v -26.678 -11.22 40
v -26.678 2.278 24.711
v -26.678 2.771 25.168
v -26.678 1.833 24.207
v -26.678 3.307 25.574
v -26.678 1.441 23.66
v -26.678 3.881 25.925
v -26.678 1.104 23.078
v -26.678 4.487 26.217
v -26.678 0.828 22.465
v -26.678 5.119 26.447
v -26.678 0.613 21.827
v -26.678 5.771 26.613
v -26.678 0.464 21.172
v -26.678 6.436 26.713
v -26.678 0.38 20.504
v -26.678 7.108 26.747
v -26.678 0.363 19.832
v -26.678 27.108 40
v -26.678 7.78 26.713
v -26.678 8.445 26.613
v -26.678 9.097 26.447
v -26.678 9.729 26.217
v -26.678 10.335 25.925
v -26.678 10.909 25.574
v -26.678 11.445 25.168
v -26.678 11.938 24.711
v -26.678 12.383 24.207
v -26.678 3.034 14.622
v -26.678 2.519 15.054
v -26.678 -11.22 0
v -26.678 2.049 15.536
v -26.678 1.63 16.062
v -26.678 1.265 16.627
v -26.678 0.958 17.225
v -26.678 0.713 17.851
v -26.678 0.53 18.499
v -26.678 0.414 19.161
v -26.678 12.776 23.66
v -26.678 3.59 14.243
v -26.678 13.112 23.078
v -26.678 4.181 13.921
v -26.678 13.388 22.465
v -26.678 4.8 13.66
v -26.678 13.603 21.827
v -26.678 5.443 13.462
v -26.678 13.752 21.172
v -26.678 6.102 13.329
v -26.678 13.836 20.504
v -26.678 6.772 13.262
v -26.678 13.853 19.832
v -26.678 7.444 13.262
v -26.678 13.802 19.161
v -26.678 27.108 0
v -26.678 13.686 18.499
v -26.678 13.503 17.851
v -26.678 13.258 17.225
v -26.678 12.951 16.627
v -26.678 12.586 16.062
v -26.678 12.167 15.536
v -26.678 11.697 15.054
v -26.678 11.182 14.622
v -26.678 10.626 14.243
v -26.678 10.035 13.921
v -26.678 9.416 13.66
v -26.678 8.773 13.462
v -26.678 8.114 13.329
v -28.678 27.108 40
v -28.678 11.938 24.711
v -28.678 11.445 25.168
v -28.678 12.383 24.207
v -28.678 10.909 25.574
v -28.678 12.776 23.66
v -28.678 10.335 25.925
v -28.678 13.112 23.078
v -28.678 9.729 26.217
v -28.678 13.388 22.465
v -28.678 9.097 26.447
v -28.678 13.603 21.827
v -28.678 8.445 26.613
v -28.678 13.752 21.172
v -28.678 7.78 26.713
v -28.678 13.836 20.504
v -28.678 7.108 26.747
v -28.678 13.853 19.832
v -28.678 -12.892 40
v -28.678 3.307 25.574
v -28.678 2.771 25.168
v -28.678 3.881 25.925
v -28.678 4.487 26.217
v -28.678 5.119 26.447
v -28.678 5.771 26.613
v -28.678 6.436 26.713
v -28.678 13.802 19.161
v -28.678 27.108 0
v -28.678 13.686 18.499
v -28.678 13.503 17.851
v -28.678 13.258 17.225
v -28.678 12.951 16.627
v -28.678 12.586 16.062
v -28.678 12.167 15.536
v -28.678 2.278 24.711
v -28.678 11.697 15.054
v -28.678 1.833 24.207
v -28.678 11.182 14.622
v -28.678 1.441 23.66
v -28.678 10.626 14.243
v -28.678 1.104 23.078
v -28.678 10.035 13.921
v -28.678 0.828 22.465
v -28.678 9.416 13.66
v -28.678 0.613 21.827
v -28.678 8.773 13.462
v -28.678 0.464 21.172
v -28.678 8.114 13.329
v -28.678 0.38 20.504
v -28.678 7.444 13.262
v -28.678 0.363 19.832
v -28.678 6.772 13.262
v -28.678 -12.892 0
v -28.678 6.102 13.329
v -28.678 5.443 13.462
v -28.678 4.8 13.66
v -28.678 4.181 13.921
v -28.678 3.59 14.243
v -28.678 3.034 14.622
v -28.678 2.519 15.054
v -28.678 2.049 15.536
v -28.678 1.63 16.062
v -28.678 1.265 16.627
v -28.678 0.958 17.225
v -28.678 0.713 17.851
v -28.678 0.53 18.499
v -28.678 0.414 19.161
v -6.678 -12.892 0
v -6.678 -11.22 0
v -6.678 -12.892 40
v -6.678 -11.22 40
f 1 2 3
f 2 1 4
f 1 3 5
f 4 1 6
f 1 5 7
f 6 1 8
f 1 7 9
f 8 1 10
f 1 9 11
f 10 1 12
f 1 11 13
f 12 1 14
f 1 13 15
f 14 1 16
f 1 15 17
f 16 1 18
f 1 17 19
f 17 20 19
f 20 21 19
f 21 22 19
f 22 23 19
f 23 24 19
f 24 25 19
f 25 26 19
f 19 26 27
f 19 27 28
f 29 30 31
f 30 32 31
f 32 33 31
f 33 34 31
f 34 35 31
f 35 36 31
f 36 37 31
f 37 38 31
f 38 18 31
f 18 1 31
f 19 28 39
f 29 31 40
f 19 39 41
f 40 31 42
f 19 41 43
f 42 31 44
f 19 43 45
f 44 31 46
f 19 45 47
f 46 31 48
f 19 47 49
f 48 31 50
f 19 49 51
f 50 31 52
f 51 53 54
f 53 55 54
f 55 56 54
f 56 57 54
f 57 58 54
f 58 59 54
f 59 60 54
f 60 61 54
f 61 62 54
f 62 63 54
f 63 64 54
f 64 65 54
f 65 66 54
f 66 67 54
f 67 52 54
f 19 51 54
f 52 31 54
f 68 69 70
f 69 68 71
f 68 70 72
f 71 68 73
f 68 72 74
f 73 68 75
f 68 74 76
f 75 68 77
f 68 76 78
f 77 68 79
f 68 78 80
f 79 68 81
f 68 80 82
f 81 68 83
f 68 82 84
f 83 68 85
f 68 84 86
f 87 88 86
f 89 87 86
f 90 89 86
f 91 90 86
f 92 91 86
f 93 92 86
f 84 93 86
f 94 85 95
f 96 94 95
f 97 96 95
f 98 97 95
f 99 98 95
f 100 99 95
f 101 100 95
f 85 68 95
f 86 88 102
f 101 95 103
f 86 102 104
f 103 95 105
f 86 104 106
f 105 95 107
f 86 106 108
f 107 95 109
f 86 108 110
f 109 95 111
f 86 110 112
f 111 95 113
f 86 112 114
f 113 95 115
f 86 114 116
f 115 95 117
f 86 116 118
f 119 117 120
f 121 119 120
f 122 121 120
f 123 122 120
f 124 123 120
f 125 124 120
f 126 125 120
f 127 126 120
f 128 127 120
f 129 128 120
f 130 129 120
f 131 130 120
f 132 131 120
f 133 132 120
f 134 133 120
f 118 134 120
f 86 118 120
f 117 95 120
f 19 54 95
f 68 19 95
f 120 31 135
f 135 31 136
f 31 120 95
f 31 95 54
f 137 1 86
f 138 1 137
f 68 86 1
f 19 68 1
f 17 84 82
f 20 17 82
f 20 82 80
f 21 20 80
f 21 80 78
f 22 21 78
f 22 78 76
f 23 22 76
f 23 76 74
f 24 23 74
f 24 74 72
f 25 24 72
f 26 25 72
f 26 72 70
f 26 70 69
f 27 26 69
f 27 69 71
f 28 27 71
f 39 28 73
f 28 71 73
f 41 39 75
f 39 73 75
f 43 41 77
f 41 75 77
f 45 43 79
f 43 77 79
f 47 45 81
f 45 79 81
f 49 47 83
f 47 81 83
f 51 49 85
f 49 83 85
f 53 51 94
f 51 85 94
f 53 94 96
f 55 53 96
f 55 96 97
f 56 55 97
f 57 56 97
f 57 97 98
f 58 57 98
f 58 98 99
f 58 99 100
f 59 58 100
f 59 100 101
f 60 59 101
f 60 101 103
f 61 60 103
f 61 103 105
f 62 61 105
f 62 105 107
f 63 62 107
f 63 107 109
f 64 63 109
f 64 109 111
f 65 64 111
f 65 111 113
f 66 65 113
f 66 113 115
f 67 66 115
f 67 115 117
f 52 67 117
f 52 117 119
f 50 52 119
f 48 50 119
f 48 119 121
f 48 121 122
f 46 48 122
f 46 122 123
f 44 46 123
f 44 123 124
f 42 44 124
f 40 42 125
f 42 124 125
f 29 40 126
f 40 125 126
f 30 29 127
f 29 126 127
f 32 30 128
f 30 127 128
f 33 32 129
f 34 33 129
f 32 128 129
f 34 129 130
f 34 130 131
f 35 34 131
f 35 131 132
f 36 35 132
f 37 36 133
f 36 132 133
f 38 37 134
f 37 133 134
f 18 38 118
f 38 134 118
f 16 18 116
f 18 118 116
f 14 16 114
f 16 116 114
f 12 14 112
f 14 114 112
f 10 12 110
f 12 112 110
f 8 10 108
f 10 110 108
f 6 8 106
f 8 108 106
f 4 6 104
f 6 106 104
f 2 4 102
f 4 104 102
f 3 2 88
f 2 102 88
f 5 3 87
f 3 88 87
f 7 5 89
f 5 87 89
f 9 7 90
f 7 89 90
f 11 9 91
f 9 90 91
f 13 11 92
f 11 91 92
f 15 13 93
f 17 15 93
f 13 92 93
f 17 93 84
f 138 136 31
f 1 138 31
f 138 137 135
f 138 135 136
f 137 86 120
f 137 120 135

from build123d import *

# Parameters (mm, degrees)
BOSS_EXTRUDE1_DEPTH = 40
SKETCH2_R           = 6.746805348
CUT_EXTRUDE1_DEPTH  = 40


with BuildPart() as part:
    # Sketch1 → Boss-Extrude1 (new body)
    with BuildSketch(Plane.XY):
        Polygon((-28.677527702, 27.108013937), (-28.677527702, -12.891986063), (-6.677527702, -12.891986063), (-6.677527702, -11.219512195), (-26.677527702, -11.219512195), (-26.677527702, 27.108013937), (-27.701917946, 27.108013937), align=None)
    extrude(amount=BOSS_EXTRUDE1_DEPTH)

    # Sketch2 → Cut-Extrude1 (cut)
    with BuildSketch(Plane.ZY.offset(28.677527702)):
        with Locations((20, 7.108013937)):
            Circle(SKETCH2_R)
    extrude(amount=-CUT_EXTRUDE1_DEPTH, mode=Mode.SUBTRACT)


solid = part.part
